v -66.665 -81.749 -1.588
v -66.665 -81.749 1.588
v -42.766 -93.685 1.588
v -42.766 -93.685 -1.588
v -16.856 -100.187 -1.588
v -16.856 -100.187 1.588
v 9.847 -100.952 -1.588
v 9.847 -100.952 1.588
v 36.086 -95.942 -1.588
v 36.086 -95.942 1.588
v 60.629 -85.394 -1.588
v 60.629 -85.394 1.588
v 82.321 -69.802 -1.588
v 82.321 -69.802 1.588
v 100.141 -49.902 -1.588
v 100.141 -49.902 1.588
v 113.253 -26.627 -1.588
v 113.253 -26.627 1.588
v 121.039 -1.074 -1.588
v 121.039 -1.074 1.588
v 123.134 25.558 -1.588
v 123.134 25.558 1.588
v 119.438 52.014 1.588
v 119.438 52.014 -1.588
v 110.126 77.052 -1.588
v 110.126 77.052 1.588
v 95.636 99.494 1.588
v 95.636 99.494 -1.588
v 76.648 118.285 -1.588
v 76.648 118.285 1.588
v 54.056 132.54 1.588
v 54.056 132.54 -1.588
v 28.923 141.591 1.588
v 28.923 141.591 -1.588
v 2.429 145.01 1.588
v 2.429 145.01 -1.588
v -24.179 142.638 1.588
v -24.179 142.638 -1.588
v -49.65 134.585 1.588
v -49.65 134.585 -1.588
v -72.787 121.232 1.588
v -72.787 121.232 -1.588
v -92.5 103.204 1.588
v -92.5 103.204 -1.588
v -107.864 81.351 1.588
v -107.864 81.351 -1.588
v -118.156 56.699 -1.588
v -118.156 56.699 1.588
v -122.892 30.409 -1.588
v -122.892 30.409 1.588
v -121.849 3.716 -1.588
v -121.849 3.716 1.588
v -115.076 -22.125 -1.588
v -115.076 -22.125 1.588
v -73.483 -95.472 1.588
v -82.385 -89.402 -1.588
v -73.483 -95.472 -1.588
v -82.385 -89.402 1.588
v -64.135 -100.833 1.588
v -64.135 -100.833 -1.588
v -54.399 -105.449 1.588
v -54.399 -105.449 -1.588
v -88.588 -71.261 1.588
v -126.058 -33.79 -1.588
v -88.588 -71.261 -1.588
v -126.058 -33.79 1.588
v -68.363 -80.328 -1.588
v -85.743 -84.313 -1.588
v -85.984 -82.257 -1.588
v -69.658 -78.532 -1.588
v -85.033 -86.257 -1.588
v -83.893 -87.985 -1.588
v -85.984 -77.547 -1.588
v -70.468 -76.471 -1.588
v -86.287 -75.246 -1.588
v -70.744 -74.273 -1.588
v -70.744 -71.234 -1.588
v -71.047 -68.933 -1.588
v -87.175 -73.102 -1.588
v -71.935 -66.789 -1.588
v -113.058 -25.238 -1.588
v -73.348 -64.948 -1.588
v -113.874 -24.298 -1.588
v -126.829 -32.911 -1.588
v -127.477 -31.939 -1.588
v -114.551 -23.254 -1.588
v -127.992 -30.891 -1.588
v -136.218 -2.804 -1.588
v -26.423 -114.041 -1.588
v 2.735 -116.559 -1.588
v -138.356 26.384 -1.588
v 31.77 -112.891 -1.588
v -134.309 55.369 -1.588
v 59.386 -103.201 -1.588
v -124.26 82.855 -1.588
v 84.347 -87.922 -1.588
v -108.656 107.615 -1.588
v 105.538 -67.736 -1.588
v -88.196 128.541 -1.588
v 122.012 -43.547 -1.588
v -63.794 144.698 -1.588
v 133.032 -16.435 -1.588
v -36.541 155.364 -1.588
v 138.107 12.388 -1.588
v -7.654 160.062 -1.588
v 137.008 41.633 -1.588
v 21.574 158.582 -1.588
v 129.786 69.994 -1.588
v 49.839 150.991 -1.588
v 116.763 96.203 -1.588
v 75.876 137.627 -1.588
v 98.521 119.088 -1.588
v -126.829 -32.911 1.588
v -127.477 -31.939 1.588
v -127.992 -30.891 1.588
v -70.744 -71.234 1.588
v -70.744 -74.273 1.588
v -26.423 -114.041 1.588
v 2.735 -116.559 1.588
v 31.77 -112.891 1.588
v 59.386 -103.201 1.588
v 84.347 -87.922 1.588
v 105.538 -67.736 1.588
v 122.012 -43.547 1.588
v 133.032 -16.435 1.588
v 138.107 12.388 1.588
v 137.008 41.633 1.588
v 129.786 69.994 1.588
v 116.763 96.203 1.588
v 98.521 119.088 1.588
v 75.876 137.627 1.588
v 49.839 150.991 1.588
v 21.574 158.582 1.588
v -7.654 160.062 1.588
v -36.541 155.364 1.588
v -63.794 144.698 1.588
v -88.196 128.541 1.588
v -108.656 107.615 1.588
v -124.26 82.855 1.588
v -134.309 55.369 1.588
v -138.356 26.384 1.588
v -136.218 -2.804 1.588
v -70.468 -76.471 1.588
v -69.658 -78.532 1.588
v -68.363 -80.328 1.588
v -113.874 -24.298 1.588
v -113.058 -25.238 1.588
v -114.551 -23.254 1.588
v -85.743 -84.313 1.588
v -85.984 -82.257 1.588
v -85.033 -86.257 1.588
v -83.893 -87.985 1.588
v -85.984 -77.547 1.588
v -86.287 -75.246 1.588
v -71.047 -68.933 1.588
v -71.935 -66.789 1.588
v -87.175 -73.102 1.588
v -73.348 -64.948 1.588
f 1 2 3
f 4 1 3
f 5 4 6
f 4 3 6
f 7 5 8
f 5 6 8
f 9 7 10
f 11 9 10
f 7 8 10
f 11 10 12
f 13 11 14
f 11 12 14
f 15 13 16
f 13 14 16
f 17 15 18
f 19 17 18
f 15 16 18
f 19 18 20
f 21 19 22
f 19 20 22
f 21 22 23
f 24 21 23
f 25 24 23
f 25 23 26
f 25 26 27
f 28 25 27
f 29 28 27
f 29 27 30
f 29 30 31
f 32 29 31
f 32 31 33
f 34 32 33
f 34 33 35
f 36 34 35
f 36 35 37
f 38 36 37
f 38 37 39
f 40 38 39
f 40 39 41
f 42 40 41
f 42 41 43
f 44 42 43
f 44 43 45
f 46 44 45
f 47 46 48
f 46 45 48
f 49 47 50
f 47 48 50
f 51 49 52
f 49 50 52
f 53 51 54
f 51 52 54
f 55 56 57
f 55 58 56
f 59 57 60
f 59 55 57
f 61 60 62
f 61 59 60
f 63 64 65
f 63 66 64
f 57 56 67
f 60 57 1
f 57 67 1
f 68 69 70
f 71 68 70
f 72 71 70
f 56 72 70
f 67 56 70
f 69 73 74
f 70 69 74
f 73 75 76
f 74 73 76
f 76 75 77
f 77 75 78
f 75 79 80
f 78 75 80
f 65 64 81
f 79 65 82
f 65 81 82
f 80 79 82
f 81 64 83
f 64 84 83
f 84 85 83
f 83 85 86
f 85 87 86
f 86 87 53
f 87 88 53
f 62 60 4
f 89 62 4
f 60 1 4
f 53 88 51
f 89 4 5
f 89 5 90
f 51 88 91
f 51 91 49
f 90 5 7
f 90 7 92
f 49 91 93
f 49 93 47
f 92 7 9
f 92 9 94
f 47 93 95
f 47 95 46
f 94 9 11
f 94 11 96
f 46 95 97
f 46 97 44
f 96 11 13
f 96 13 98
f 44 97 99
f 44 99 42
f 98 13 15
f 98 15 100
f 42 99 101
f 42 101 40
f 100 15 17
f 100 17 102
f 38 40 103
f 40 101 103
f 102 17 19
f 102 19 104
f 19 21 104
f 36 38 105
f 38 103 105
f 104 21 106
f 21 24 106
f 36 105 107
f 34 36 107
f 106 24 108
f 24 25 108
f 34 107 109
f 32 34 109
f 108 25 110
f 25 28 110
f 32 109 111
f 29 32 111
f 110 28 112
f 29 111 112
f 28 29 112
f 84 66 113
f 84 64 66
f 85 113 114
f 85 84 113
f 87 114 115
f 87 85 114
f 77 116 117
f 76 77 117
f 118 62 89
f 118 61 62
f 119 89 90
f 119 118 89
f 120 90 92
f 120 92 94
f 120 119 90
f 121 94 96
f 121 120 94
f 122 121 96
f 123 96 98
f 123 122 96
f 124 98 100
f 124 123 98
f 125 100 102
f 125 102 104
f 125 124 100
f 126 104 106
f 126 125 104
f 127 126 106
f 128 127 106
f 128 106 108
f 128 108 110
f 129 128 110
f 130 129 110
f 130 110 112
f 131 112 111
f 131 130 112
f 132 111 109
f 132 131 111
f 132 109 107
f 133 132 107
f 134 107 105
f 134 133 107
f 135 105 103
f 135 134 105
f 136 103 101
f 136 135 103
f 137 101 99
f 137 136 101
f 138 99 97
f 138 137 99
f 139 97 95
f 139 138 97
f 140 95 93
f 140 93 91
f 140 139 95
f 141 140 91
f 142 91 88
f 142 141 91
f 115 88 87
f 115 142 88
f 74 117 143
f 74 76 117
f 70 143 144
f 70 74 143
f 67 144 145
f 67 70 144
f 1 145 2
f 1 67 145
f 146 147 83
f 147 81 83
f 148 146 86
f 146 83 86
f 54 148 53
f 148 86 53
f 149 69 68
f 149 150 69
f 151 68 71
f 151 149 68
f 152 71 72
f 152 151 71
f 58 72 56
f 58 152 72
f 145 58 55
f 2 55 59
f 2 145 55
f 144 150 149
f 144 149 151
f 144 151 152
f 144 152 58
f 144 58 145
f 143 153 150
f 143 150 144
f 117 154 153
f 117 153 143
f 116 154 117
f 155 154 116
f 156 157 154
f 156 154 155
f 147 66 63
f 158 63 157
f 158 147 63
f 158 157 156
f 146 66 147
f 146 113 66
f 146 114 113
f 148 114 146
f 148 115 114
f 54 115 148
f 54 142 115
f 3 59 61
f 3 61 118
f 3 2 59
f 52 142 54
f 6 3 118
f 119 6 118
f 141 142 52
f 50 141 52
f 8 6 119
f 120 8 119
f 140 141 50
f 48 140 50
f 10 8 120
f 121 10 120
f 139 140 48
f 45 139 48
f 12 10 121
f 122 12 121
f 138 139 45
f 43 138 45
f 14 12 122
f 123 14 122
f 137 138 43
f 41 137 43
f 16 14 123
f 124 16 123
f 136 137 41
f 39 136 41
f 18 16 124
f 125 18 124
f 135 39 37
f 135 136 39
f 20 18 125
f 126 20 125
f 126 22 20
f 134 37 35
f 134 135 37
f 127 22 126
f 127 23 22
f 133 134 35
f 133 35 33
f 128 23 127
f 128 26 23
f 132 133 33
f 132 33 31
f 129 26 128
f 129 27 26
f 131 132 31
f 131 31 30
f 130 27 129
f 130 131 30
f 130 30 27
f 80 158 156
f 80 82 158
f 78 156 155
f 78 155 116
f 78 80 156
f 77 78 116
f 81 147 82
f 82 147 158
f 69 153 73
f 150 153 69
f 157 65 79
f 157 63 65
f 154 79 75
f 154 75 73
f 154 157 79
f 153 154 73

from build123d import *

# Parameters (mm, degrees)
BOSS_EXTRUDE1_DEPTH = 1.5875
CUT_EXTRUDE1_DEPTH  = 3.175
FILLET1_R           = 8.89


with BuildPart() as part:
    # Sketch1 → Boss-Extrude1 (new, symmetric)
    with BuildSketch(Plane.XY):
        with BuildLine():
            Line((-127.293308919, -32.555250036), (-85.984130762, -73.864428193))
            Line((-85.984130762, -73.864428193), (-85.984130762, -86.643760402))
            ThreePointArc((-85.984130762, -86.643760402), (-70.818680903, -97.099597285), (-54.399250036, -105.449308919))
            ThreePointArc((-54.399250036, -105.449308919), (97.88479172, 119.72879172), (-127.293308919, -32.555250036))
        make_face()
    extrude(amount=BOSS_EXTRUDE1_DEPTH, both=True)

    # Sketch2 → Cut-Extrude1 (cut)
    with BuildSketch(Plane.XY.offset(1.5875)):
        with BuildLine():
            Line((-114.372852664, -23.923091601), (-70.744130762, -67.551813503))
            Line((-70.744130762, -67.551813503), (-70.744130762, -79.00759425))
            ThreePointArc((-70.744130762, -79.00759425), (96.569405073, 98.330117066), (-114.372852664, -23.923091601))
        make_face()
    extrude(amount=-CUT_EXTRUDE1_DEPTH, mode=Mode.SUBTRACT)

    # Fillet1
    fillet1_edges = [part.edges().sort_by_distance(p)[0] for p in [
        (-114.372852664, -23.923091601, 0),
        (-70.744130762, -79.00759425, 0),
        (-70.744130762, -67.551813503, 0),
        (-85.984130762, -86.643760402, -0.79375),
        (-85.984130762, -73.864428193, -0.79375),
        (-127.293308919, -32.555250036, -0.79375),
    ]]
    fillet(fillet1_edges, radius=FILLET1_R)


solid = part.part
